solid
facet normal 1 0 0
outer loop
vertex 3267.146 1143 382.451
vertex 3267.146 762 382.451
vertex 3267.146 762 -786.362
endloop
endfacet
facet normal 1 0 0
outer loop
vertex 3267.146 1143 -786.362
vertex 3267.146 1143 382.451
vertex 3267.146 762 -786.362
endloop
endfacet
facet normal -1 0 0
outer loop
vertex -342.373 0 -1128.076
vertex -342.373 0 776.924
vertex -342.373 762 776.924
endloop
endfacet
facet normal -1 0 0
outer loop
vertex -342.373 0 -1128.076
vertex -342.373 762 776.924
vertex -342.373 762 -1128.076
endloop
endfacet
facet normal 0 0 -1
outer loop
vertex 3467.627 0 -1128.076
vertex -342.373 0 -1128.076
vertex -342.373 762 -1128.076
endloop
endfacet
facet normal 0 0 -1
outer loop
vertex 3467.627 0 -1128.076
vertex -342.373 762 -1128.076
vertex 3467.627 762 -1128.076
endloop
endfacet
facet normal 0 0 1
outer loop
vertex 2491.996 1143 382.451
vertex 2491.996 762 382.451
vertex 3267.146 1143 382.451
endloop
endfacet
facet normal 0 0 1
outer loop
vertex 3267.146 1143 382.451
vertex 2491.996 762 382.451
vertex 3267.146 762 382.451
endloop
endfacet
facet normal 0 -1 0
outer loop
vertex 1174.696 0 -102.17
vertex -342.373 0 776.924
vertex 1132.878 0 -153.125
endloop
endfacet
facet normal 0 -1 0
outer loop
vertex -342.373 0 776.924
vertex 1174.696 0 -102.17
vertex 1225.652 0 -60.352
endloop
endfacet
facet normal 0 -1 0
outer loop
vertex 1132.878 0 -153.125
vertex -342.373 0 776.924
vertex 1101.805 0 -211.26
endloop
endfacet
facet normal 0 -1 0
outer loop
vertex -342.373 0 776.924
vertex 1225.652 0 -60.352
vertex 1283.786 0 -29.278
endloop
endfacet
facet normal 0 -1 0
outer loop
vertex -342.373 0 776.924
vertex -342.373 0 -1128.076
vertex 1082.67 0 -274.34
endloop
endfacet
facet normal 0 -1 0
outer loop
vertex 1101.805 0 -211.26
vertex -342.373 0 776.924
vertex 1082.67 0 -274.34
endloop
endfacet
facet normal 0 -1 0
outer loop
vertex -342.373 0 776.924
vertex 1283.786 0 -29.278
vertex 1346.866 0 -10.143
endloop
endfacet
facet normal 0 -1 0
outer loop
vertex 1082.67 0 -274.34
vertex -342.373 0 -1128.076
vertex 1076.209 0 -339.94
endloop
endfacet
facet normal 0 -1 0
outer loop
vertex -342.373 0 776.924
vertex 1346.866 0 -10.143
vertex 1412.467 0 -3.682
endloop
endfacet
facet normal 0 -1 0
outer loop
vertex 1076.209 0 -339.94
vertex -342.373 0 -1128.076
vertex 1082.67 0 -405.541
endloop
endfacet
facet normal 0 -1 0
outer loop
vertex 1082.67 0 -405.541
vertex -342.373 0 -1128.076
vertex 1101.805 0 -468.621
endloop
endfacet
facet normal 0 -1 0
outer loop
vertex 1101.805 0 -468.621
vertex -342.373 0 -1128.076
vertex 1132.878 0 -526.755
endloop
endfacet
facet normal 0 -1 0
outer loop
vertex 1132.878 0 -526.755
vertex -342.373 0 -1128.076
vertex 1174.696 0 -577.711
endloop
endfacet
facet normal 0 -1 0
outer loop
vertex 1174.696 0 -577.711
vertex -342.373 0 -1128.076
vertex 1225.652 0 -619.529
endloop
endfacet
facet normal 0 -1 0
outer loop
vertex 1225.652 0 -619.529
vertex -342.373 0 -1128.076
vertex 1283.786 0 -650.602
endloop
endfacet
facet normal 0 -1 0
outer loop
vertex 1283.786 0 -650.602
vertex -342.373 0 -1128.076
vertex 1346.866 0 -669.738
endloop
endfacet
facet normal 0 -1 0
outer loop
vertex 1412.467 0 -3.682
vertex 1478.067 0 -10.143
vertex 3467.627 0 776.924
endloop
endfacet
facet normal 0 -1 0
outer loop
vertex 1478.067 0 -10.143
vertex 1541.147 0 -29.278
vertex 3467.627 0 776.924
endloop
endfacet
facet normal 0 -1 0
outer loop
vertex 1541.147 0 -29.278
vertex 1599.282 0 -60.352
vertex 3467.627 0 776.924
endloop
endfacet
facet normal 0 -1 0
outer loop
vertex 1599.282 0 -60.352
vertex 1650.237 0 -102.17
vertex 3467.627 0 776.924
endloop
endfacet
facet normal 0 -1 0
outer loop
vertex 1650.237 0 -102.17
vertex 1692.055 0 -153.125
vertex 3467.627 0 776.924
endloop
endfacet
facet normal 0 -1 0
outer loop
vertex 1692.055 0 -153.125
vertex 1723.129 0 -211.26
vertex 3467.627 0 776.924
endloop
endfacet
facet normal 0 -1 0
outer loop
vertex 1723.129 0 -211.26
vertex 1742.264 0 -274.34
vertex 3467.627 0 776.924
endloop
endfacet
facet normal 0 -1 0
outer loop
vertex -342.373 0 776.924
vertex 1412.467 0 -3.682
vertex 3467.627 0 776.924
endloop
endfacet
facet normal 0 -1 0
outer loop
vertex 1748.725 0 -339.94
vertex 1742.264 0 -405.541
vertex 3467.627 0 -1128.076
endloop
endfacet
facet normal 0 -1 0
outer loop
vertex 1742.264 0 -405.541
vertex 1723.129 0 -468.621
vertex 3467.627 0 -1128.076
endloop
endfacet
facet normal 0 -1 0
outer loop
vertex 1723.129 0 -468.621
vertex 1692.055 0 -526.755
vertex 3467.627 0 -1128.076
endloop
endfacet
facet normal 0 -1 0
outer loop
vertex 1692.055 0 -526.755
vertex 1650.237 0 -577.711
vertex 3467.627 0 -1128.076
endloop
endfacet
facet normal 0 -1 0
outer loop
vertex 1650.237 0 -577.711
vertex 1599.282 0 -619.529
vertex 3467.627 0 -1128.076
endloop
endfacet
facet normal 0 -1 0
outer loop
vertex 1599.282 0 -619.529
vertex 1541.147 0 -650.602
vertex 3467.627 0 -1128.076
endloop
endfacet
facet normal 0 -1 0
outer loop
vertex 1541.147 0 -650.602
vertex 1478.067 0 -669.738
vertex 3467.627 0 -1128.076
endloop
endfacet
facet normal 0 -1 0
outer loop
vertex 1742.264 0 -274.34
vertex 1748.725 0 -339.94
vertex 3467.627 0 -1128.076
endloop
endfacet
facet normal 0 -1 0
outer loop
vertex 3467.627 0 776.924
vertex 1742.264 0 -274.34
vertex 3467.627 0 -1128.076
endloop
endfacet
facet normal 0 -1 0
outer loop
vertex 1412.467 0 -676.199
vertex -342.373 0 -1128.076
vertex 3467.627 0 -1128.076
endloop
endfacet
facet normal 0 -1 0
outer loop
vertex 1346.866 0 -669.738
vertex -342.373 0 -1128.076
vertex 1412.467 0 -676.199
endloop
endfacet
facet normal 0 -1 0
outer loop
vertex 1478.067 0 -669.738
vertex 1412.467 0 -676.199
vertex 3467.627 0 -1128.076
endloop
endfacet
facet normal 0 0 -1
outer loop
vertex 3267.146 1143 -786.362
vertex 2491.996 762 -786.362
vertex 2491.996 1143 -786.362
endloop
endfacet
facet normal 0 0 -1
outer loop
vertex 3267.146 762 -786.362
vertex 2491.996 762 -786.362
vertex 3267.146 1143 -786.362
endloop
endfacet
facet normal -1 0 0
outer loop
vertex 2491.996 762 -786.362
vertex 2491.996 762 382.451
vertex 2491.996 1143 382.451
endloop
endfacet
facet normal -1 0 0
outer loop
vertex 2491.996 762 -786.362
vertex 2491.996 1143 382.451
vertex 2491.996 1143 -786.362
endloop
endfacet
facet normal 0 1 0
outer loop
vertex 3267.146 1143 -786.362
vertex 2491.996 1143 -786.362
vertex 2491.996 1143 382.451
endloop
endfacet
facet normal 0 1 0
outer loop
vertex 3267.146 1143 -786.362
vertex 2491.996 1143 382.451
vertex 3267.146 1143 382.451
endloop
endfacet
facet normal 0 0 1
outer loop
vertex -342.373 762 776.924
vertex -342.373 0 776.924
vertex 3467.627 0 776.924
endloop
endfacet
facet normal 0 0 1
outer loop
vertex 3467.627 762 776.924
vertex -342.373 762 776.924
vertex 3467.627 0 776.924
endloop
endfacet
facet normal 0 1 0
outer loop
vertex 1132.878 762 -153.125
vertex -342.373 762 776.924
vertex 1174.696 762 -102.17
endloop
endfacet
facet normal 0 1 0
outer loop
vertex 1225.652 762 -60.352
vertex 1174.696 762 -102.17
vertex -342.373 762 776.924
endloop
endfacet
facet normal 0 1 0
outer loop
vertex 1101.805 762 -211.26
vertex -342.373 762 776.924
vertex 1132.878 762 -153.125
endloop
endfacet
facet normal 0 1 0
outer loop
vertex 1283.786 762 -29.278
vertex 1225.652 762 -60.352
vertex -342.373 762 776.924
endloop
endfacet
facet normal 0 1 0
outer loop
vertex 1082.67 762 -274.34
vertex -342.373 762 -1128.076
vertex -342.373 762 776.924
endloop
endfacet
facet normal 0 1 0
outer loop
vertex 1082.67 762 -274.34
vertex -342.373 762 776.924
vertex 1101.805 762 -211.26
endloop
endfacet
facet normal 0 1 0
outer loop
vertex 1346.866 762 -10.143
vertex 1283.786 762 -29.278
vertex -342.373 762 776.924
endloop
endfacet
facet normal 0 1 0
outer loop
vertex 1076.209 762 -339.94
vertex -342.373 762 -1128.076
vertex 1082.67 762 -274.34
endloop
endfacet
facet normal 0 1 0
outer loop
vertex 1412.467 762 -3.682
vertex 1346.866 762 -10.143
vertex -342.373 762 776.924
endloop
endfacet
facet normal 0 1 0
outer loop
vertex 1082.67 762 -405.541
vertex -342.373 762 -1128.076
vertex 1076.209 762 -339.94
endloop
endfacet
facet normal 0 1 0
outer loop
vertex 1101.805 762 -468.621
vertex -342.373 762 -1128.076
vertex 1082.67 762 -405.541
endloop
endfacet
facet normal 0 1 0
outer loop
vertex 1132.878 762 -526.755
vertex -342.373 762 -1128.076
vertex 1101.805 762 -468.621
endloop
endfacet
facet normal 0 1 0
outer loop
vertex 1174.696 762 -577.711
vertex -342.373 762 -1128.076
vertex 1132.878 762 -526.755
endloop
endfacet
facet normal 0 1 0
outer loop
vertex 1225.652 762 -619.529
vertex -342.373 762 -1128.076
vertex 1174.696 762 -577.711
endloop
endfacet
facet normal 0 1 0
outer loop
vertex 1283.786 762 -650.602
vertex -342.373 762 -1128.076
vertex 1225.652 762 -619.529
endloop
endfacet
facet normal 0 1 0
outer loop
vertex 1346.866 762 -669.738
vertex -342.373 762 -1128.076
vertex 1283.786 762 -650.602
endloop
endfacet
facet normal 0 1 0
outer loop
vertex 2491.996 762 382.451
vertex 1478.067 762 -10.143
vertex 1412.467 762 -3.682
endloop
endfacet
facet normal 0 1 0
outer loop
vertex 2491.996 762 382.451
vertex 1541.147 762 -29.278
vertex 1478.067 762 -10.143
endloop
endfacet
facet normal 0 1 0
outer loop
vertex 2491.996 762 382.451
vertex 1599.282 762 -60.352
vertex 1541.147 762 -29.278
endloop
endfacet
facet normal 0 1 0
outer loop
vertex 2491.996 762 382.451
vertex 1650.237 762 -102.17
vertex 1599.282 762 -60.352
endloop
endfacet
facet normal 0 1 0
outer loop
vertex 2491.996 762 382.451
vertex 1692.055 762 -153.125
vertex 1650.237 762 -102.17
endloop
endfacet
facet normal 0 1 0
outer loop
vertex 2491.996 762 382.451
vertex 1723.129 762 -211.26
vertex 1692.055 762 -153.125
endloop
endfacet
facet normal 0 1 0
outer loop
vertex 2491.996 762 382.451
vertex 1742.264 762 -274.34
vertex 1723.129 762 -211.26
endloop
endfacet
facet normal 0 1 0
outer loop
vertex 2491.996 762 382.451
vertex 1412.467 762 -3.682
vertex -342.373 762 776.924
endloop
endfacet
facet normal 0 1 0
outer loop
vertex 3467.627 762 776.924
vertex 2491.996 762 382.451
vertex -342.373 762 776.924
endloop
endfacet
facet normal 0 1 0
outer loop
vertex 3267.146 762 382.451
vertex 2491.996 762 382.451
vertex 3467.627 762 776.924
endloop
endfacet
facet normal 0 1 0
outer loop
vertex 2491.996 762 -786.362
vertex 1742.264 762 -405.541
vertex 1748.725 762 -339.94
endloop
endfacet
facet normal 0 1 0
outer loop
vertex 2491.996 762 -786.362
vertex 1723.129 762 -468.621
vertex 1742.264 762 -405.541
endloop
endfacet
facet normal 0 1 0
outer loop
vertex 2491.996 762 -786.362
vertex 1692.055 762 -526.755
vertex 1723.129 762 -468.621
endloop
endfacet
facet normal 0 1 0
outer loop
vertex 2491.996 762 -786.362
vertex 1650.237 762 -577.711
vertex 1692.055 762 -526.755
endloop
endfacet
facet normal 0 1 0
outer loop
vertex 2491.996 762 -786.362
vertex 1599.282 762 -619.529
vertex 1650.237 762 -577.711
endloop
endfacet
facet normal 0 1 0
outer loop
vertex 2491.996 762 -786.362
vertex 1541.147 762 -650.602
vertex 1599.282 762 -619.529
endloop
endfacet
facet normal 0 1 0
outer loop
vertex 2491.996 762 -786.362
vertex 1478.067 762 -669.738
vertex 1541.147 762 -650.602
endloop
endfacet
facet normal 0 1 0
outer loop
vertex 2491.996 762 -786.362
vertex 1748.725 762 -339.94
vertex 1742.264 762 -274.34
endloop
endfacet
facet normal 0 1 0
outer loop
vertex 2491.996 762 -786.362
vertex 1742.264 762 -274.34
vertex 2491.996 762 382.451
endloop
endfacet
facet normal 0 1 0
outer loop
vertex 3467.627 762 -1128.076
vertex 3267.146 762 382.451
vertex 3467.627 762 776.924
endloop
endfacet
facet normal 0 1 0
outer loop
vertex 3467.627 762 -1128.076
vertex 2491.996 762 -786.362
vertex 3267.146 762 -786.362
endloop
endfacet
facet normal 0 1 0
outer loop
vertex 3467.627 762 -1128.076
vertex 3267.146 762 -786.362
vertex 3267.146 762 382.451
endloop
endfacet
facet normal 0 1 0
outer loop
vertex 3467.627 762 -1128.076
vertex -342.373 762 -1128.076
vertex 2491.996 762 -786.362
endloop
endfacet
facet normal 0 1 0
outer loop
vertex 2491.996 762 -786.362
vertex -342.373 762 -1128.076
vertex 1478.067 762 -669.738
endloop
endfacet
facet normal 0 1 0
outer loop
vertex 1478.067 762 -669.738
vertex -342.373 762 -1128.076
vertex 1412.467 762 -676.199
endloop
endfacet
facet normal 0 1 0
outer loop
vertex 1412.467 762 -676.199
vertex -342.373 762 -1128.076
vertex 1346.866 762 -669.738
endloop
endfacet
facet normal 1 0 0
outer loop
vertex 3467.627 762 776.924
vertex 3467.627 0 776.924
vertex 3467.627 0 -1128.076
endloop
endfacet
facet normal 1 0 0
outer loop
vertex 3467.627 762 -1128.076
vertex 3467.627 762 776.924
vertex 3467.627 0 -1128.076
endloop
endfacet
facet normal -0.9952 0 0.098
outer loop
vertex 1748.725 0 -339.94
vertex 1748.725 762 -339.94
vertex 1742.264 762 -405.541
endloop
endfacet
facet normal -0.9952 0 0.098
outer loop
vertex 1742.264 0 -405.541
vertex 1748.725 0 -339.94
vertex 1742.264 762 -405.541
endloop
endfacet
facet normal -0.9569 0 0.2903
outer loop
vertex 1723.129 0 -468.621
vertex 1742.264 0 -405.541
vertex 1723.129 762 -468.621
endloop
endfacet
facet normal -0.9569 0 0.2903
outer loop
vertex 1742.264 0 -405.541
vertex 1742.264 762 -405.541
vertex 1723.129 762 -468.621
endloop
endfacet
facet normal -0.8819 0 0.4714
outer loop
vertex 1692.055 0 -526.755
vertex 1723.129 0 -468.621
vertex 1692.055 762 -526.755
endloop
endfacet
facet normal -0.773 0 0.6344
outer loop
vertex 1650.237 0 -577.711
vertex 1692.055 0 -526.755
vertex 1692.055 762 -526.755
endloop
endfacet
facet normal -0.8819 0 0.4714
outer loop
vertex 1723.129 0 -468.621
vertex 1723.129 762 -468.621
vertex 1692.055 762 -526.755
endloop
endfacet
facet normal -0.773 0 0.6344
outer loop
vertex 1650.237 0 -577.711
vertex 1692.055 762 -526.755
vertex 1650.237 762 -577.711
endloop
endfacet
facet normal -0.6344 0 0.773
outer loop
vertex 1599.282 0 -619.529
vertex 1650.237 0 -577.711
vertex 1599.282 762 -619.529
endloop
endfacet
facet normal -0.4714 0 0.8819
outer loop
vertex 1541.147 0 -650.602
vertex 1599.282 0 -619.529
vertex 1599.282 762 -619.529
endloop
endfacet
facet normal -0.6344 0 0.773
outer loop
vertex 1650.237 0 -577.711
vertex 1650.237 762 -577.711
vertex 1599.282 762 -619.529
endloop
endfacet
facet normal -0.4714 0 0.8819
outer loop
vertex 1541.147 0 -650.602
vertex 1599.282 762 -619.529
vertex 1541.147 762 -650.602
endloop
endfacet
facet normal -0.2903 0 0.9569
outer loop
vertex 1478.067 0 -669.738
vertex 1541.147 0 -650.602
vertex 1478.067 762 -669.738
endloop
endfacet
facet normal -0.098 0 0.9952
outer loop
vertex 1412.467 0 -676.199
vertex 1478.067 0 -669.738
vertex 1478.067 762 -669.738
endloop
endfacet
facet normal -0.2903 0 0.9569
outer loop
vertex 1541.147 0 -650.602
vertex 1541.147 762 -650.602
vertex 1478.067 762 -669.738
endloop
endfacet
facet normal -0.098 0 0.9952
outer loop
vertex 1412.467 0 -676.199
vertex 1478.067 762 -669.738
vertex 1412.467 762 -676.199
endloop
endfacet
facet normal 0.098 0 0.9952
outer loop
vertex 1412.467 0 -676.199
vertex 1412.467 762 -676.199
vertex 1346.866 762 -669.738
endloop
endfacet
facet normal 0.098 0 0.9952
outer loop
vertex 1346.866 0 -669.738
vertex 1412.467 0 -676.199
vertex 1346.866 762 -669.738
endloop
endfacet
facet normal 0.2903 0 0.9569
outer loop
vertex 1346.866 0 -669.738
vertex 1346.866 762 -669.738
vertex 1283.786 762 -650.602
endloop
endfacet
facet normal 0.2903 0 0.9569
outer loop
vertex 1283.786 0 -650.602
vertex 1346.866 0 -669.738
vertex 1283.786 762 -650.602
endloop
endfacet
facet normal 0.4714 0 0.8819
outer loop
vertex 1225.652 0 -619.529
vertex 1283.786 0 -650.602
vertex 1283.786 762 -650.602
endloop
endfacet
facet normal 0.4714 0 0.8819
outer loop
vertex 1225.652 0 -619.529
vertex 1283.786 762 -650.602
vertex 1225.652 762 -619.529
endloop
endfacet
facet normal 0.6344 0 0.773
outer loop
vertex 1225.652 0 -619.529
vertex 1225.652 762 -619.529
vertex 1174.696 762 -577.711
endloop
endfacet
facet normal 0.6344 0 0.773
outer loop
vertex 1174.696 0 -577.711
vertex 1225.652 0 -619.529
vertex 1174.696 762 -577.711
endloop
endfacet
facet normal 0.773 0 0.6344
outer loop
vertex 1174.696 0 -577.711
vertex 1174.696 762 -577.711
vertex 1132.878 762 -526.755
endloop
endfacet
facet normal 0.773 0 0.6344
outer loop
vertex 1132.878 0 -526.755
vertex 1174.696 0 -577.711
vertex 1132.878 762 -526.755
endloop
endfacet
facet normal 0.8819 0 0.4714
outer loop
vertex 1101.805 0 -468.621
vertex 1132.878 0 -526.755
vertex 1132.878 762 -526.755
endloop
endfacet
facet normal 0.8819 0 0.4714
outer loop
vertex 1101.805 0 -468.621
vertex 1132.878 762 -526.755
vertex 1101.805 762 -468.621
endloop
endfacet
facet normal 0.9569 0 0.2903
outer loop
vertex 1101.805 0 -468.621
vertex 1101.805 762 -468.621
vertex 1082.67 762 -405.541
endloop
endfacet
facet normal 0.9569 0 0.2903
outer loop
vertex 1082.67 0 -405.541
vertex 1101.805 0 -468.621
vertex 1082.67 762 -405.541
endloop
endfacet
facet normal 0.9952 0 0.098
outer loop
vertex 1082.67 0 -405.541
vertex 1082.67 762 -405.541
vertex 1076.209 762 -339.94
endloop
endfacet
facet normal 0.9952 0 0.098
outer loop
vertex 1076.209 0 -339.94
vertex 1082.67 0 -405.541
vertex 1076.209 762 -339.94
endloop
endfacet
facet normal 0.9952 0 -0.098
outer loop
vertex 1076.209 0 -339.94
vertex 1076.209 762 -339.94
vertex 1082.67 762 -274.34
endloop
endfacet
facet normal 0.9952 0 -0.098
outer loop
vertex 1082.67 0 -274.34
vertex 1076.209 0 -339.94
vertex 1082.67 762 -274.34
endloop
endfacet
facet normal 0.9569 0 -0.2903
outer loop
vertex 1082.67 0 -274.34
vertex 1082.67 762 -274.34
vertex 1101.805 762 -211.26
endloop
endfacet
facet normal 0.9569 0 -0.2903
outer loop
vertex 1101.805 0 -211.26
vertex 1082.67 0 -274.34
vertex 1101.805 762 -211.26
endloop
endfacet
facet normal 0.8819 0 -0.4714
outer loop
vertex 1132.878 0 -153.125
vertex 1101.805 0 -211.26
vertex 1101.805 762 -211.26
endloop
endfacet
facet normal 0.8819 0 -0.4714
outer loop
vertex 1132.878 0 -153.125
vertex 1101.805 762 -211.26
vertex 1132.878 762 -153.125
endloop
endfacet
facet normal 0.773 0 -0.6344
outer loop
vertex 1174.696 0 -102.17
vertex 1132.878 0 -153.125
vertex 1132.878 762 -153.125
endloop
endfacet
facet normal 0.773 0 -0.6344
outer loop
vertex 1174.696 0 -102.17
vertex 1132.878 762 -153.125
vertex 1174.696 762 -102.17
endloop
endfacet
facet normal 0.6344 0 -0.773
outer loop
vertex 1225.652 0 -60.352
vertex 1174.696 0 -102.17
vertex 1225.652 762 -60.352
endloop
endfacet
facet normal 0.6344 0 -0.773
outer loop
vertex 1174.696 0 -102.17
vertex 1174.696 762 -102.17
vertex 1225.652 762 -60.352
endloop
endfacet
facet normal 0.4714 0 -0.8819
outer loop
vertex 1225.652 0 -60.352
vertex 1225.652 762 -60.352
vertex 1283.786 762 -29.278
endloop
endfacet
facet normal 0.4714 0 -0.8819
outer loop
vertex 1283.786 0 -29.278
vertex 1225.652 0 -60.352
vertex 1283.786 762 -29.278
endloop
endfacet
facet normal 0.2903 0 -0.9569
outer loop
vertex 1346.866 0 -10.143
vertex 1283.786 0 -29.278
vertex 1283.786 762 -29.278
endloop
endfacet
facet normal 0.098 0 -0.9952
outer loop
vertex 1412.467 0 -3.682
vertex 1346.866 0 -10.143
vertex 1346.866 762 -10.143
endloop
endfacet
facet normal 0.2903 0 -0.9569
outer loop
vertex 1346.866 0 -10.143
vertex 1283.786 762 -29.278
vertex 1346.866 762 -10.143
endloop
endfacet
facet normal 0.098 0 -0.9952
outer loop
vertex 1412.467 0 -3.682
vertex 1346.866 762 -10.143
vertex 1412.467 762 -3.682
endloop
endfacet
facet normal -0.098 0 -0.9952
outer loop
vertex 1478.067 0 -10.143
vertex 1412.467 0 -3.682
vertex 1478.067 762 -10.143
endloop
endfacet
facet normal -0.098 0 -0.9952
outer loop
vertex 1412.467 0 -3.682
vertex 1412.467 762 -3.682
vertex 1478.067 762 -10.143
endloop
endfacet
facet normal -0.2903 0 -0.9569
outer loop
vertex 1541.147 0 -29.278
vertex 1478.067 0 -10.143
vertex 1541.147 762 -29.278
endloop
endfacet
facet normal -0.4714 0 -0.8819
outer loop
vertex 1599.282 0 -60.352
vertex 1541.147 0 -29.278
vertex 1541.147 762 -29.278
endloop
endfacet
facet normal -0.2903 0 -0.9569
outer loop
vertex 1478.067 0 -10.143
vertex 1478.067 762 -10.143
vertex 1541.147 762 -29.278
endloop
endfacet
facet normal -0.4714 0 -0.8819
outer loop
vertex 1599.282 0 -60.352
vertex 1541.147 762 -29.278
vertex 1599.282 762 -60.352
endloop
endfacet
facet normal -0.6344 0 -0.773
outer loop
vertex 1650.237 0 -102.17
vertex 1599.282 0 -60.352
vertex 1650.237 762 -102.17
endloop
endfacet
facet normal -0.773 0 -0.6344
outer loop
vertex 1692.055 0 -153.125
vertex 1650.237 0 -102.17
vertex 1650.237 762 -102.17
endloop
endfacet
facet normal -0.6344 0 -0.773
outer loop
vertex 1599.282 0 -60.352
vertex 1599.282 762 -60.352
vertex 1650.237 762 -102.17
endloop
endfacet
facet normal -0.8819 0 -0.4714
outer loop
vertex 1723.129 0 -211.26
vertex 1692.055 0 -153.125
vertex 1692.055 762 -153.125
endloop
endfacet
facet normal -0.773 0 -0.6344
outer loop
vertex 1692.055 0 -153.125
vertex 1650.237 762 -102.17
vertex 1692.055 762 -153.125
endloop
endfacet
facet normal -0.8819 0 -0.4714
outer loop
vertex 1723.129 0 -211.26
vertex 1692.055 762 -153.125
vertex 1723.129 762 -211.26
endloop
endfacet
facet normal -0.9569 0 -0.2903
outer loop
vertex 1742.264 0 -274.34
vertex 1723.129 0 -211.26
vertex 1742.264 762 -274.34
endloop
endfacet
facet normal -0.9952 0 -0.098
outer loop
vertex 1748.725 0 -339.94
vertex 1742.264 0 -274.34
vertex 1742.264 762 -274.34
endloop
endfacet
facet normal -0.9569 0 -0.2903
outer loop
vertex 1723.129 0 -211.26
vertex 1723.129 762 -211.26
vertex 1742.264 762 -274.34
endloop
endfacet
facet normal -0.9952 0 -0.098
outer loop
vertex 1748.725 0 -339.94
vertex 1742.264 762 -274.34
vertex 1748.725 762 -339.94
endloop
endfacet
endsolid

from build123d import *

# Parameters (mm, degrees)
SKETCH1_W           = 3810
SKETCH1_H           = 1905
BOSS_EXTRUDE1_DEPTH = 762
SKETCH2_R           = 336.258211588
CUT_EXTRUDE1_DEPTH  = 763
SKETCH3_W           = 775.150416673
SKETCH3_H           = 1168.813193726
BOSS_EXTRUDE2_DEPTH = 381


with BuildPart() as part:
    # Sketch1 → Boss-Extrude1 (new body)
    with BuildSketch(Plane(origin=(0, 0, 0), x_dir=(1, 0, 0), z_dir=(0, 1, 0))):
        with Locations((1562.626728111, 175.576036866)):
            Rectangle(SKETCH1_W, SKETCH1_H)
    extrude(amount=BOSS_EXTRUDE1_DEPTH)

    # Sketch2 → Cut-Extrude1 (cut, through all)
    with BuildSketch(Plane(origin=(0, 762, 0), x_dir=(1, 0, 0), z_dir=(0, 1, 0))):
        with Locations((1412.4667322, 339.940416015)):
            Circle(SKETCH2_R)
    extrude(amount=-CUT_EXTRUDE1_DEPTH, mode=Mode.SUBTRACT)

    # Sketch3 → Boss-Extrude2 (add)
    with BuildSketch(Plane(origin=(0, 762, 0), x_dir=(1, 0, 0), z_dir=(0, 1, 0))):
        with Locations((2879.570760626, 201.955501308)):
            Rectangle(SKETCH3_W, SKETCH3_H)
    extrude(amount=BOSS_EXTRUDE2_DEPTH)


solid = part.part
